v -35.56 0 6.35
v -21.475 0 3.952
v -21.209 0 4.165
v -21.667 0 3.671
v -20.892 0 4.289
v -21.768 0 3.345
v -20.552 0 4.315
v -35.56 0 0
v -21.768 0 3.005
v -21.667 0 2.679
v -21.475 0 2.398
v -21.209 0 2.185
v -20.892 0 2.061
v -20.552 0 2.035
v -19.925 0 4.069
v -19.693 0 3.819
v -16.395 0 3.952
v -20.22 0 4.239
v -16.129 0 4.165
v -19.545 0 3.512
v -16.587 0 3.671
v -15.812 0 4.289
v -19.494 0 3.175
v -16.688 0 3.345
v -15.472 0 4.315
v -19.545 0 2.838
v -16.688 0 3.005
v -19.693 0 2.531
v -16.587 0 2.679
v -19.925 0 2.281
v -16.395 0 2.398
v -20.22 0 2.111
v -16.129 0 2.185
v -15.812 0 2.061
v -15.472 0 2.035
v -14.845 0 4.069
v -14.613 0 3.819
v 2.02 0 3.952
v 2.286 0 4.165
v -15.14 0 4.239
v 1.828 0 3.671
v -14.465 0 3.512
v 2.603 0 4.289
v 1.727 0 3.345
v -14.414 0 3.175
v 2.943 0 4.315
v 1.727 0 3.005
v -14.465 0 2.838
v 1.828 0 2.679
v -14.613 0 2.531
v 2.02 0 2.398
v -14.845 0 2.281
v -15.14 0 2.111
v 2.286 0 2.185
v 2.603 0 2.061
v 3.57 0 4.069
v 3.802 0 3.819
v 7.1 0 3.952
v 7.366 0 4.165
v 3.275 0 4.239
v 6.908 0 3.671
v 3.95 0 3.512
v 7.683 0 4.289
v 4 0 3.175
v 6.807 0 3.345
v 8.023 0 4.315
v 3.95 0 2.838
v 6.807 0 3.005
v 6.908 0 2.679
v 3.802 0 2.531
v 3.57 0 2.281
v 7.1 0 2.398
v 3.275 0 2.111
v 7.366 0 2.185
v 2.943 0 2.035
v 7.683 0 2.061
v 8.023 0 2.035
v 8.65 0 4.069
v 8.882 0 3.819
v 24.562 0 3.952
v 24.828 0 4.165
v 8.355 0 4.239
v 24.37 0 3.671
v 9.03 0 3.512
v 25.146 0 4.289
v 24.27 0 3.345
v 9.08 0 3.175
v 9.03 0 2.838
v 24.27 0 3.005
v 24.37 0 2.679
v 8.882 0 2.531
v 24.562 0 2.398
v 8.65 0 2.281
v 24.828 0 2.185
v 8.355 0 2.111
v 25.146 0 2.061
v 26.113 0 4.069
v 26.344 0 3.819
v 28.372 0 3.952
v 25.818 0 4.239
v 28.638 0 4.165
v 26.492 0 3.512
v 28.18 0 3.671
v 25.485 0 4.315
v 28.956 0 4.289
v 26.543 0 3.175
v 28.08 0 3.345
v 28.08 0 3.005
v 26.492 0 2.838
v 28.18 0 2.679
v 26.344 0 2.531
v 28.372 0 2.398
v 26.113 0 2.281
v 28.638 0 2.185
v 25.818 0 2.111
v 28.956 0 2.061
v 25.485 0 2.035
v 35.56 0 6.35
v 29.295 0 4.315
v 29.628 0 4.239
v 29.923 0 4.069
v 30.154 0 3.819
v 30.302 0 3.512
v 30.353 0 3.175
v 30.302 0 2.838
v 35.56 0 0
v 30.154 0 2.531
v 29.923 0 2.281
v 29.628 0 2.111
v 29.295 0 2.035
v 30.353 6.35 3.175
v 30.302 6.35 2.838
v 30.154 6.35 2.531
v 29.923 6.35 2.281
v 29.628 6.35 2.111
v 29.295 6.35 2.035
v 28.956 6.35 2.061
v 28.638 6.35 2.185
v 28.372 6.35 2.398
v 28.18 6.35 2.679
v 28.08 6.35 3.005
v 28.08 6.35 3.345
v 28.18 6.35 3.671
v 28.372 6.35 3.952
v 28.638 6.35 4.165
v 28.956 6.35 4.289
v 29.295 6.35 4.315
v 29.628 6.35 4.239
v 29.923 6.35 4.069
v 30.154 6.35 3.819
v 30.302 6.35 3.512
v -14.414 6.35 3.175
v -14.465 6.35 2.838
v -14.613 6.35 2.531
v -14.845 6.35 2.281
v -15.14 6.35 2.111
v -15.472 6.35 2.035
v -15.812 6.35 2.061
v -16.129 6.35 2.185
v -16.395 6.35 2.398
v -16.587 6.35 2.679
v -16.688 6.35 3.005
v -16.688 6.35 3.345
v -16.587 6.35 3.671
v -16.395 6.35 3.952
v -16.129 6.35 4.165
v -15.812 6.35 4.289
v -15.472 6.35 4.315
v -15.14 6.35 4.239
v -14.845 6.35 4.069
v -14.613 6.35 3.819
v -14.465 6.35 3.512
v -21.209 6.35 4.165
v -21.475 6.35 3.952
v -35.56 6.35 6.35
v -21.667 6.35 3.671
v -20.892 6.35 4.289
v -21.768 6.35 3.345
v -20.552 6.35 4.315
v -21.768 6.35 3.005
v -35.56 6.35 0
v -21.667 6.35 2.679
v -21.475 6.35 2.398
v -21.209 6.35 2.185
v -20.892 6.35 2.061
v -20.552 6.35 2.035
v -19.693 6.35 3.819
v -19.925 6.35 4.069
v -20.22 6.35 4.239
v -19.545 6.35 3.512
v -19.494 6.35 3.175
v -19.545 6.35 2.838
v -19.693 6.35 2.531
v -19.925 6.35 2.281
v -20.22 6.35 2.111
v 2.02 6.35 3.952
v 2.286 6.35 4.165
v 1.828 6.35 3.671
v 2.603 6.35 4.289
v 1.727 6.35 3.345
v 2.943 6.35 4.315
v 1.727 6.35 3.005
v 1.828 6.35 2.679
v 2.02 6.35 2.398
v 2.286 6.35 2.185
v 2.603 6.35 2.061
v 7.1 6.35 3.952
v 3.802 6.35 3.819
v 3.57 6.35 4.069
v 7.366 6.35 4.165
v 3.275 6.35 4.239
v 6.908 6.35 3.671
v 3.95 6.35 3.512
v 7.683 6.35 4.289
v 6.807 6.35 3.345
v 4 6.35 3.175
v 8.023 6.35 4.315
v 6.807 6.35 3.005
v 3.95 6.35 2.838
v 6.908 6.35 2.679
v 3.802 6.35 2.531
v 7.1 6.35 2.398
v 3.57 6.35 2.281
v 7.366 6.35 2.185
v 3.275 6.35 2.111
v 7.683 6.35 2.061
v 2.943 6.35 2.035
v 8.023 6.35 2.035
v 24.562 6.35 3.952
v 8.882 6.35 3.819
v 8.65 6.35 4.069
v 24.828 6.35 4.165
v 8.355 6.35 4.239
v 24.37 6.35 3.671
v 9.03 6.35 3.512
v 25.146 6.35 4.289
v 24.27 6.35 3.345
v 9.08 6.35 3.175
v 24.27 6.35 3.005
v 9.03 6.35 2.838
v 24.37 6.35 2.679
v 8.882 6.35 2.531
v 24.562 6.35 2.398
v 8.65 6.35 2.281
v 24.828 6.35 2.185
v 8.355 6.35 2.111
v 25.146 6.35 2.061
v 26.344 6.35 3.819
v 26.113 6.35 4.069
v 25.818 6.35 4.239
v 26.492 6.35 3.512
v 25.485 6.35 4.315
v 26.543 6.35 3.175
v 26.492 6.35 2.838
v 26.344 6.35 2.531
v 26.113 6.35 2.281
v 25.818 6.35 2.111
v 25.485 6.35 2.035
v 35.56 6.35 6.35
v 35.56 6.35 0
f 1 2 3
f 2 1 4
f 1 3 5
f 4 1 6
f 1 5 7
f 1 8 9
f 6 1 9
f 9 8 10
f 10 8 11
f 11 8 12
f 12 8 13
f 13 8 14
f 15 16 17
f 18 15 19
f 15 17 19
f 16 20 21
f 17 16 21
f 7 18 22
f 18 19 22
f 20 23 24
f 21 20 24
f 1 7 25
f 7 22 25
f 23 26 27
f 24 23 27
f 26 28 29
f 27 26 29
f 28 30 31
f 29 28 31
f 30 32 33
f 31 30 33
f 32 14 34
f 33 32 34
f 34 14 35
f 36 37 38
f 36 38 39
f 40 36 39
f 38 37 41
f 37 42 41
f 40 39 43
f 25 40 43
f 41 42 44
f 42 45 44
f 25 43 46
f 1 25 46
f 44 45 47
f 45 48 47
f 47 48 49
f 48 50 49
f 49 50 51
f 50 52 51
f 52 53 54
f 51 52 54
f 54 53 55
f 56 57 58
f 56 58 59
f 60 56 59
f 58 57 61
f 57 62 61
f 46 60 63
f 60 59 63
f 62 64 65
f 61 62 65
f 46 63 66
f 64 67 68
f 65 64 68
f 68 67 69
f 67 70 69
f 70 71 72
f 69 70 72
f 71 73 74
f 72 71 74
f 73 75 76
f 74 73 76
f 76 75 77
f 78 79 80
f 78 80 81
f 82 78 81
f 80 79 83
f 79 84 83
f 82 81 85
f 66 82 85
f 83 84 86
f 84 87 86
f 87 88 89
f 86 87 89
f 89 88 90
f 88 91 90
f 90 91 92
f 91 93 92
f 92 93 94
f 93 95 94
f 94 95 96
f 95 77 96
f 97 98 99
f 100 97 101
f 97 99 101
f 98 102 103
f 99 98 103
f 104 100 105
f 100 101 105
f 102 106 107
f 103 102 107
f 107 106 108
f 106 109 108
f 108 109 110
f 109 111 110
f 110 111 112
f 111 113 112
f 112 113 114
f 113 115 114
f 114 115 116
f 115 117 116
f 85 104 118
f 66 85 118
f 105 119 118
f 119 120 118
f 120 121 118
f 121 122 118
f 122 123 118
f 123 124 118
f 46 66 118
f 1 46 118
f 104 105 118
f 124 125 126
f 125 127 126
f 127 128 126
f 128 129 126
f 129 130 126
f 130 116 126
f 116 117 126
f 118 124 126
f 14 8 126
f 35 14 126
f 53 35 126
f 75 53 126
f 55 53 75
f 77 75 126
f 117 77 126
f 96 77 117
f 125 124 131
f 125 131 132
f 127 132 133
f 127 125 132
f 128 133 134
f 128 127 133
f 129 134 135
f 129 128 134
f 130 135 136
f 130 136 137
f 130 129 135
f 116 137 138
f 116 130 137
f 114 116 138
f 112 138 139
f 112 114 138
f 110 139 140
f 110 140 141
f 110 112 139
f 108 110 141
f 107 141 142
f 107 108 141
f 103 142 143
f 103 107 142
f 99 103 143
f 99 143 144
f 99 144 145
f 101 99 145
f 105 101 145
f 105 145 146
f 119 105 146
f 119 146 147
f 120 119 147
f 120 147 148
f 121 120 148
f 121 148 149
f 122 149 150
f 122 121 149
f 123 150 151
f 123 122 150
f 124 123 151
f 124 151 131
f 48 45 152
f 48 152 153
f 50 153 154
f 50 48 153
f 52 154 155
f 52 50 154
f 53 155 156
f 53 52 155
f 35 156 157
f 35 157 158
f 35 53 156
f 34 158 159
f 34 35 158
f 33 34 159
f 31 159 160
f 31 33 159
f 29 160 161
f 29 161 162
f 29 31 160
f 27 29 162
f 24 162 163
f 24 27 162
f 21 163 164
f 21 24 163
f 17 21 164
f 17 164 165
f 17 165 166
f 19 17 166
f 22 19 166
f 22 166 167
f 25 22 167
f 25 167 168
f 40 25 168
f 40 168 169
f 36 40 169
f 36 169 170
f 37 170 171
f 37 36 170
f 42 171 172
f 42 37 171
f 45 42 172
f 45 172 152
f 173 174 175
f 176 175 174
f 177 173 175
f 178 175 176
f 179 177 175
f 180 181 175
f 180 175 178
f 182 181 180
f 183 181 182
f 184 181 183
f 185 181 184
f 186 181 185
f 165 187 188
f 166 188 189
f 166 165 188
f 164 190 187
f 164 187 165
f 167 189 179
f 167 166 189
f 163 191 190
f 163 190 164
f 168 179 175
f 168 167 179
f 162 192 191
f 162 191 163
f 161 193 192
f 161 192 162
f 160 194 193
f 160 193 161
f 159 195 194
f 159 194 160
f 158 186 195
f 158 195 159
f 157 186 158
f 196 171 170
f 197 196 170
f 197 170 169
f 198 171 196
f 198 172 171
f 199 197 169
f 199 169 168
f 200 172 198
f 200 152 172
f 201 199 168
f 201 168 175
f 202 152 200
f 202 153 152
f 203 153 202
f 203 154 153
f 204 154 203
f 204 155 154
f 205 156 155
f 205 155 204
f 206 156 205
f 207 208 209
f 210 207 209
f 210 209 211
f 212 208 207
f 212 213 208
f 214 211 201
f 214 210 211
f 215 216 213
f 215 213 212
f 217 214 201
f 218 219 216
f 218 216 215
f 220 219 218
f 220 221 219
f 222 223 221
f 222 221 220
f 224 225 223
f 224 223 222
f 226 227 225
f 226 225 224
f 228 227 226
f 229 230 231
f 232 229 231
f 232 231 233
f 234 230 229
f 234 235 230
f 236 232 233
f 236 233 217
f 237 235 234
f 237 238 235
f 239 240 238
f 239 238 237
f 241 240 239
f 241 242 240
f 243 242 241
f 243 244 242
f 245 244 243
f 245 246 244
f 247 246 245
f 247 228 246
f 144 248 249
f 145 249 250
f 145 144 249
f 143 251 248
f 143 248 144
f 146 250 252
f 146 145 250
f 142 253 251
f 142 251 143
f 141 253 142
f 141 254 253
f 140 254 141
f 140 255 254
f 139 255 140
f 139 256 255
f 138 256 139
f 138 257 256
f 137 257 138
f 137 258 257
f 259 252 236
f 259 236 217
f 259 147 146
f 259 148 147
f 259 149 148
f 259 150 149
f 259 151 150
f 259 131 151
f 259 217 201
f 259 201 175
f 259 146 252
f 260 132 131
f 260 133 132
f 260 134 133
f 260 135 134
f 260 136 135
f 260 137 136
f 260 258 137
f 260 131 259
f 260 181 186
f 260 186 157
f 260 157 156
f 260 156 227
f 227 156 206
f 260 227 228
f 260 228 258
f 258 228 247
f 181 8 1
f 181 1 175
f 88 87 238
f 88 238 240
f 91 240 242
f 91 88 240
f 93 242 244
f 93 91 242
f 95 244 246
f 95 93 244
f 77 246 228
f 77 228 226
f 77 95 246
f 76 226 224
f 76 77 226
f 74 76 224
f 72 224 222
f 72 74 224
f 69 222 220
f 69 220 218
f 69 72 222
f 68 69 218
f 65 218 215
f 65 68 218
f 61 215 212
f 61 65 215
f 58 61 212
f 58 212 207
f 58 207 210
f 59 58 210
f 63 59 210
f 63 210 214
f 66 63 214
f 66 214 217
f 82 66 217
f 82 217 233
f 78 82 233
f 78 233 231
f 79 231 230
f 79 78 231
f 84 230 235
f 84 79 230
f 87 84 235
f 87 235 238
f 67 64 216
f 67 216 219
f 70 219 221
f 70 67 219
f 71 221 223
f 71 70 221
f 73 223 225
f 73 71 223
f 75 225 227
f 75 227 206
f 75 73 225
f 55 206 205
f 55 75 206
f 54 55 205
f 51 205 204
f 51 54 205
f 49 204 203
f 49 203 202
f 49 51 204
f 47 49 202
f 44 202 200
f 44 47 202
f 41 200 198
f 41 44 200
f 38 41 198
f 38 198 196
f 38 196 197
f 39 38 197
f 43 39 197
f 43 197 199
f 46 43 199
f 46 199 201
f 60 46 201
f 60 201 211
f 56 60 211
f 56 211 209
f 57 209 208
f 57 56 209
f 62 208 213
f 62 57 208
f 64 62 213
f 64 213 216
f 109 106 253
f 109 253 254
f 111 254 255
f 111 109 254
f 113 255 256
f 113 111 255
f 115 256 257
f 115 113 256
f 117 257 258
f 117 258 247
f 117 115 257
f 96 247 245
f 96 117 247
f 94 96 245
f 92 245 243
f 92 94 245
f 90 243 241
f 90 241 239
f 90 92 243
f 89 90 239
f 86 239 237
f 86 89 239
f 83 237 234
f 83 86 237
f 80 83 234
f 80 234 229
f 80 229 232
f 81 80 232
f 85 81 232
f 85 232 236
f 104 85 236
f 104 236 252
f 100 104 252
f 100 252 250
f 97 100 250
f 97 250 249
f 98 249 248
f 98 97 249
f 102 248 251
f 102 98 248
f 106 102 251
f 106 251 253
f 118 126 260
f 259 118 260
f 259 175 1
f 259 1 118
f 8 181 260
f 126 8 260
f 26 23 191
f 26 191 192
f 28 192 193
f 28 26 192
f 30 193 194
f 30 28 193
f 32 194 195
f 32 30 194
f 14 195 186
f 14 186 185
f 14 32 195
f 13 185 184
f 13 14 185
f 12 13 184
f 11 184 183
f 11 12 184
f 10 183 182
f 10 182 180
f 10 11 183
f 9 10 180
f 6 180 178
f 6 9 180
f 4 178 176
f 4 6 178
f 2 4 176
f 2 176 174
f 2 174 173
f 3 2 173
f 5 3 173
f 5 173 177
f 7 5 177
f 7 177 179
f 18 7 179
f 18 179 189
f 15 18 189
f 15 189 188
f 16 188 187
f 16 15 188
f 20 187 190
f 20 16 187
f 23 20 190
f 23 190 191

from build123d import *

# Parameters (mm, degrees)
SKETCH2_W           = 71.12
SKETCH2_H           = 6.35
BOSS_EXTRUDE1_DEPTH = 6.35
SKETCH3_R           = 1.143
CUT_EXTRUDE2_DEPTH  = 6.35


with BuildPart() as part:
    # Sketch2 → Boss-Extrude1 (new body)
    with BuildSketch(Plane.XY):
        with Locations((0, 3.175)):
            Rectangle(SKETCH2_W, SKETCH2_H)
    extrude(amount=BOSS_EXTRUDE1_DEPTH)

    # Sketch3 → Cut-Extrude2 (cut)
    with BuildSketch(Plane(origin=(0, 0, 0), x_dir=(1, 0, 0), z_dir=(0, 1, 0))):
        with Locations((-20.6375, -3.175)):
            Circle(SKETCH3_R)
        with Locations((-15.5575, -3.175)):
            Circle(SKETCH3_R)
        with Locations((2.8575, -3.175)):
            Circle(SKETCH3_R)
        with Locations((7.9375, -3.175)):
            Circle(SKETCH3_R)
        with Locations((25.4, -3.175)):
            Circle(SKETCH3_R)
        with Locations((29.21, -3.175)):
            Circle(SKETCH3_R)
    extrude(amount=CUT_EXTRUDE2_DEPTH, mode=Mode.SUBTRACT)


solid = part.part
